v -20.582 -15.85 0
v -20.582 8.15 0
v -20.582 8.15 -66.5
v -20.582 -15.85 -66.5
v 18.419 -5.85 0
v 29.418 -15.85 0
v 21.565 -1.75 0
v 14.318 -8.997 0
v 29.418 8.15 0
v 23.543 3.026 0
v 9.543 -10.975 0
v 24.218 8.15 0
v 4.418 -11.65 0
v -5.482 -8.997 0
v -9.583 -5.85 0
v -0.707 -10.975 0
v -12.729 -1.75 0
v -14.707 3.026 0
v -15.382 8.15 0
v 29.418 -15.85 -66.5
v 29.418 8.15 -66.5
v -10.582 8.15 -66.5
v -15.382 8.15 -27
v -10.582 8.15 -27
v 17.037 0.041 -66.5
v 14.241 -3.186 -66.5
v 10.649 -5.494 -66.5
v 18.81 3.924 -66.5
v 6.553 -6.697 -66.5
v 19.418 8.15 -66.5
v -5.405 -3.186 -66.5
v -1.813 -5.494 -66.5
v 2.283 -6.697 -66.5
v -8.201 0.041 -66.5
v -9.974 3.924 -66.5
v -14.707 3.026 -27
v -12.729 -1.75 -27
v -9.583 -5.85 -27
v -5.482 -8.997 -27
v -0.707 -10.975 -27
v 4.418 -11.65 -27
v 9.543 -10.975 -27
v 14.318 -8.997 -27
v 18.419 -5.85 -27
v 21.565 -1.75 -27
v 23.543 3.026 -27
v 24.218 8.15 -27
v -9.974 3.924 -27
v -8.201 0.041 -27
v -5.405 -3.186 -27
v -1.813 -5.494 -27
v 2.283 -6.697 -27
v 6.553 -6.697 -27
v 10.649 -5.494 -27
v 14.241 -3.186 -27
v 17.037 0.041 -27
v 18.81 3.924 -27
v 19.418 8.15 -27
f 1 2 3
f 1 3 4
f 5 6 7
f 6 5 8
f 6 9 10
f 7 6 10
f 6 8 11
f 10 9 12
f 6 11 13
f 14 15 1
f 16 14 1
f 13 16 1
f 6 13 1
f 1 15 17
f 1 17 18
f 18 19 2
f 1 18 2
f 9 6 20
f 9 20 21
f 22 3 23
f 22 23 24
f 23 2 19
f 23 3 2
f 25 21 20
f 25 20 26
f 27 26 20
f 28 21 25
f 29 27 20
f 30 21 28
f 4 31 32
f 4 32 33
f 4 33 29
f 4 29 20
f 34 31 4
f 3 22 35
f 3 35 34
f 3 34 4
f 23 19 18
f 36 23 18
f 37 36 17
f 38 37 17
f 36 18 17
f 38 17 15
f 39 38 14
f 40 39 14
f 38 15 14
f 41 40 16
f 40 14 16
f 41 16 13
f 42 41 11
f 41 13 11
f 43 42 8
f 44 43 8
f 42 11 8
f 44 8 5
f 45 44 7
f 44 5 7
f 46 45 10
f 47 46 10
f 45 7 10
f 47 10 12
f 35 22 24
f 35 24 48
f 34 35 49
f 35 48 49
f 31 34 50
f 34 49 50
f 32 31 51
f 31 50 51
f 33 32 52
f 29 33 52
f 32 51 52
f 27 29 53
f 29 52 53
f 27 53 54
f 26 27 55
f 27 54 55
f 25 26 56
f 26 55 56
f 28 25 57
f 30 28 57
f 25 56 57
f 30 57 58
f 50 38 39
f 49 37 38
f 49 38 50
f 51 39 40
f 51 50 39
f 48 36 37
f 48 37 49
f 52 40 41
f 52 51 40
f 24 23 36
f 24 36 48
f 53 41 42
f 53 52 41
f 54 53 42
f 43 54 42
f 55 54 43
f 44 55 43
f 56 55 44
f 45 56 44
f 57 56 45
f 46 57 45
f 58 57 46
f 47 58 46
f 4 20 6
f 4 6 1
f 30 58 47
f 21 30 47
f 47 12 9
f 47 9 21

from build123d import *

# Parameters (mm, degrees)
BOSS_EXTRUDE1_DEPTH = 66.5
SKETCH4_R           = 19.8
CUT_EXTRUDE1_DEPTH  = 27
SKETCH5_R           = 15
CUT_EXTRUDE2_DEPTH  = 52.738521814


with BuildPart() as part:
    # Sketch1 → Boss-Extrude1 (new body)
    with BuildSketch(Plane.XY):
        Polygon((-20.582022726, -5.70241059), (-20.582022726, 8.150480999), (29.417977274, 8.150480999), (29.417977274, -11.649519001), (29.417977274, -15.849519001), (-20.582022726, -15.849519001), align=None)
    extrude(amount=-BOSS_EXTRUDE1_DEPTH)

    # Sketch4 → Cut-Extrude1 (cut)
    with BuildSketch(Plane.XY):
        with Locations((4.417977274, 8.150480999)):
            Circle(SKETCH4_R)
    extrude(amount=-CUT_EXTRUDE1_DEPTH, mode=Mode.SUBTRACT)

    # Sketch5 → Cut-Extrude2 (cut, through all)
    with BuildSketch(Plane.XY.offset(-27)):
        with Locations((4.417977274, 8.150480999)):
            Circle(SKETCH5_R)
    extrude(amount=-CUT_EXTRUDE2_DEPTH, mode=Mode.SUBTRACT)


solid = part.part
